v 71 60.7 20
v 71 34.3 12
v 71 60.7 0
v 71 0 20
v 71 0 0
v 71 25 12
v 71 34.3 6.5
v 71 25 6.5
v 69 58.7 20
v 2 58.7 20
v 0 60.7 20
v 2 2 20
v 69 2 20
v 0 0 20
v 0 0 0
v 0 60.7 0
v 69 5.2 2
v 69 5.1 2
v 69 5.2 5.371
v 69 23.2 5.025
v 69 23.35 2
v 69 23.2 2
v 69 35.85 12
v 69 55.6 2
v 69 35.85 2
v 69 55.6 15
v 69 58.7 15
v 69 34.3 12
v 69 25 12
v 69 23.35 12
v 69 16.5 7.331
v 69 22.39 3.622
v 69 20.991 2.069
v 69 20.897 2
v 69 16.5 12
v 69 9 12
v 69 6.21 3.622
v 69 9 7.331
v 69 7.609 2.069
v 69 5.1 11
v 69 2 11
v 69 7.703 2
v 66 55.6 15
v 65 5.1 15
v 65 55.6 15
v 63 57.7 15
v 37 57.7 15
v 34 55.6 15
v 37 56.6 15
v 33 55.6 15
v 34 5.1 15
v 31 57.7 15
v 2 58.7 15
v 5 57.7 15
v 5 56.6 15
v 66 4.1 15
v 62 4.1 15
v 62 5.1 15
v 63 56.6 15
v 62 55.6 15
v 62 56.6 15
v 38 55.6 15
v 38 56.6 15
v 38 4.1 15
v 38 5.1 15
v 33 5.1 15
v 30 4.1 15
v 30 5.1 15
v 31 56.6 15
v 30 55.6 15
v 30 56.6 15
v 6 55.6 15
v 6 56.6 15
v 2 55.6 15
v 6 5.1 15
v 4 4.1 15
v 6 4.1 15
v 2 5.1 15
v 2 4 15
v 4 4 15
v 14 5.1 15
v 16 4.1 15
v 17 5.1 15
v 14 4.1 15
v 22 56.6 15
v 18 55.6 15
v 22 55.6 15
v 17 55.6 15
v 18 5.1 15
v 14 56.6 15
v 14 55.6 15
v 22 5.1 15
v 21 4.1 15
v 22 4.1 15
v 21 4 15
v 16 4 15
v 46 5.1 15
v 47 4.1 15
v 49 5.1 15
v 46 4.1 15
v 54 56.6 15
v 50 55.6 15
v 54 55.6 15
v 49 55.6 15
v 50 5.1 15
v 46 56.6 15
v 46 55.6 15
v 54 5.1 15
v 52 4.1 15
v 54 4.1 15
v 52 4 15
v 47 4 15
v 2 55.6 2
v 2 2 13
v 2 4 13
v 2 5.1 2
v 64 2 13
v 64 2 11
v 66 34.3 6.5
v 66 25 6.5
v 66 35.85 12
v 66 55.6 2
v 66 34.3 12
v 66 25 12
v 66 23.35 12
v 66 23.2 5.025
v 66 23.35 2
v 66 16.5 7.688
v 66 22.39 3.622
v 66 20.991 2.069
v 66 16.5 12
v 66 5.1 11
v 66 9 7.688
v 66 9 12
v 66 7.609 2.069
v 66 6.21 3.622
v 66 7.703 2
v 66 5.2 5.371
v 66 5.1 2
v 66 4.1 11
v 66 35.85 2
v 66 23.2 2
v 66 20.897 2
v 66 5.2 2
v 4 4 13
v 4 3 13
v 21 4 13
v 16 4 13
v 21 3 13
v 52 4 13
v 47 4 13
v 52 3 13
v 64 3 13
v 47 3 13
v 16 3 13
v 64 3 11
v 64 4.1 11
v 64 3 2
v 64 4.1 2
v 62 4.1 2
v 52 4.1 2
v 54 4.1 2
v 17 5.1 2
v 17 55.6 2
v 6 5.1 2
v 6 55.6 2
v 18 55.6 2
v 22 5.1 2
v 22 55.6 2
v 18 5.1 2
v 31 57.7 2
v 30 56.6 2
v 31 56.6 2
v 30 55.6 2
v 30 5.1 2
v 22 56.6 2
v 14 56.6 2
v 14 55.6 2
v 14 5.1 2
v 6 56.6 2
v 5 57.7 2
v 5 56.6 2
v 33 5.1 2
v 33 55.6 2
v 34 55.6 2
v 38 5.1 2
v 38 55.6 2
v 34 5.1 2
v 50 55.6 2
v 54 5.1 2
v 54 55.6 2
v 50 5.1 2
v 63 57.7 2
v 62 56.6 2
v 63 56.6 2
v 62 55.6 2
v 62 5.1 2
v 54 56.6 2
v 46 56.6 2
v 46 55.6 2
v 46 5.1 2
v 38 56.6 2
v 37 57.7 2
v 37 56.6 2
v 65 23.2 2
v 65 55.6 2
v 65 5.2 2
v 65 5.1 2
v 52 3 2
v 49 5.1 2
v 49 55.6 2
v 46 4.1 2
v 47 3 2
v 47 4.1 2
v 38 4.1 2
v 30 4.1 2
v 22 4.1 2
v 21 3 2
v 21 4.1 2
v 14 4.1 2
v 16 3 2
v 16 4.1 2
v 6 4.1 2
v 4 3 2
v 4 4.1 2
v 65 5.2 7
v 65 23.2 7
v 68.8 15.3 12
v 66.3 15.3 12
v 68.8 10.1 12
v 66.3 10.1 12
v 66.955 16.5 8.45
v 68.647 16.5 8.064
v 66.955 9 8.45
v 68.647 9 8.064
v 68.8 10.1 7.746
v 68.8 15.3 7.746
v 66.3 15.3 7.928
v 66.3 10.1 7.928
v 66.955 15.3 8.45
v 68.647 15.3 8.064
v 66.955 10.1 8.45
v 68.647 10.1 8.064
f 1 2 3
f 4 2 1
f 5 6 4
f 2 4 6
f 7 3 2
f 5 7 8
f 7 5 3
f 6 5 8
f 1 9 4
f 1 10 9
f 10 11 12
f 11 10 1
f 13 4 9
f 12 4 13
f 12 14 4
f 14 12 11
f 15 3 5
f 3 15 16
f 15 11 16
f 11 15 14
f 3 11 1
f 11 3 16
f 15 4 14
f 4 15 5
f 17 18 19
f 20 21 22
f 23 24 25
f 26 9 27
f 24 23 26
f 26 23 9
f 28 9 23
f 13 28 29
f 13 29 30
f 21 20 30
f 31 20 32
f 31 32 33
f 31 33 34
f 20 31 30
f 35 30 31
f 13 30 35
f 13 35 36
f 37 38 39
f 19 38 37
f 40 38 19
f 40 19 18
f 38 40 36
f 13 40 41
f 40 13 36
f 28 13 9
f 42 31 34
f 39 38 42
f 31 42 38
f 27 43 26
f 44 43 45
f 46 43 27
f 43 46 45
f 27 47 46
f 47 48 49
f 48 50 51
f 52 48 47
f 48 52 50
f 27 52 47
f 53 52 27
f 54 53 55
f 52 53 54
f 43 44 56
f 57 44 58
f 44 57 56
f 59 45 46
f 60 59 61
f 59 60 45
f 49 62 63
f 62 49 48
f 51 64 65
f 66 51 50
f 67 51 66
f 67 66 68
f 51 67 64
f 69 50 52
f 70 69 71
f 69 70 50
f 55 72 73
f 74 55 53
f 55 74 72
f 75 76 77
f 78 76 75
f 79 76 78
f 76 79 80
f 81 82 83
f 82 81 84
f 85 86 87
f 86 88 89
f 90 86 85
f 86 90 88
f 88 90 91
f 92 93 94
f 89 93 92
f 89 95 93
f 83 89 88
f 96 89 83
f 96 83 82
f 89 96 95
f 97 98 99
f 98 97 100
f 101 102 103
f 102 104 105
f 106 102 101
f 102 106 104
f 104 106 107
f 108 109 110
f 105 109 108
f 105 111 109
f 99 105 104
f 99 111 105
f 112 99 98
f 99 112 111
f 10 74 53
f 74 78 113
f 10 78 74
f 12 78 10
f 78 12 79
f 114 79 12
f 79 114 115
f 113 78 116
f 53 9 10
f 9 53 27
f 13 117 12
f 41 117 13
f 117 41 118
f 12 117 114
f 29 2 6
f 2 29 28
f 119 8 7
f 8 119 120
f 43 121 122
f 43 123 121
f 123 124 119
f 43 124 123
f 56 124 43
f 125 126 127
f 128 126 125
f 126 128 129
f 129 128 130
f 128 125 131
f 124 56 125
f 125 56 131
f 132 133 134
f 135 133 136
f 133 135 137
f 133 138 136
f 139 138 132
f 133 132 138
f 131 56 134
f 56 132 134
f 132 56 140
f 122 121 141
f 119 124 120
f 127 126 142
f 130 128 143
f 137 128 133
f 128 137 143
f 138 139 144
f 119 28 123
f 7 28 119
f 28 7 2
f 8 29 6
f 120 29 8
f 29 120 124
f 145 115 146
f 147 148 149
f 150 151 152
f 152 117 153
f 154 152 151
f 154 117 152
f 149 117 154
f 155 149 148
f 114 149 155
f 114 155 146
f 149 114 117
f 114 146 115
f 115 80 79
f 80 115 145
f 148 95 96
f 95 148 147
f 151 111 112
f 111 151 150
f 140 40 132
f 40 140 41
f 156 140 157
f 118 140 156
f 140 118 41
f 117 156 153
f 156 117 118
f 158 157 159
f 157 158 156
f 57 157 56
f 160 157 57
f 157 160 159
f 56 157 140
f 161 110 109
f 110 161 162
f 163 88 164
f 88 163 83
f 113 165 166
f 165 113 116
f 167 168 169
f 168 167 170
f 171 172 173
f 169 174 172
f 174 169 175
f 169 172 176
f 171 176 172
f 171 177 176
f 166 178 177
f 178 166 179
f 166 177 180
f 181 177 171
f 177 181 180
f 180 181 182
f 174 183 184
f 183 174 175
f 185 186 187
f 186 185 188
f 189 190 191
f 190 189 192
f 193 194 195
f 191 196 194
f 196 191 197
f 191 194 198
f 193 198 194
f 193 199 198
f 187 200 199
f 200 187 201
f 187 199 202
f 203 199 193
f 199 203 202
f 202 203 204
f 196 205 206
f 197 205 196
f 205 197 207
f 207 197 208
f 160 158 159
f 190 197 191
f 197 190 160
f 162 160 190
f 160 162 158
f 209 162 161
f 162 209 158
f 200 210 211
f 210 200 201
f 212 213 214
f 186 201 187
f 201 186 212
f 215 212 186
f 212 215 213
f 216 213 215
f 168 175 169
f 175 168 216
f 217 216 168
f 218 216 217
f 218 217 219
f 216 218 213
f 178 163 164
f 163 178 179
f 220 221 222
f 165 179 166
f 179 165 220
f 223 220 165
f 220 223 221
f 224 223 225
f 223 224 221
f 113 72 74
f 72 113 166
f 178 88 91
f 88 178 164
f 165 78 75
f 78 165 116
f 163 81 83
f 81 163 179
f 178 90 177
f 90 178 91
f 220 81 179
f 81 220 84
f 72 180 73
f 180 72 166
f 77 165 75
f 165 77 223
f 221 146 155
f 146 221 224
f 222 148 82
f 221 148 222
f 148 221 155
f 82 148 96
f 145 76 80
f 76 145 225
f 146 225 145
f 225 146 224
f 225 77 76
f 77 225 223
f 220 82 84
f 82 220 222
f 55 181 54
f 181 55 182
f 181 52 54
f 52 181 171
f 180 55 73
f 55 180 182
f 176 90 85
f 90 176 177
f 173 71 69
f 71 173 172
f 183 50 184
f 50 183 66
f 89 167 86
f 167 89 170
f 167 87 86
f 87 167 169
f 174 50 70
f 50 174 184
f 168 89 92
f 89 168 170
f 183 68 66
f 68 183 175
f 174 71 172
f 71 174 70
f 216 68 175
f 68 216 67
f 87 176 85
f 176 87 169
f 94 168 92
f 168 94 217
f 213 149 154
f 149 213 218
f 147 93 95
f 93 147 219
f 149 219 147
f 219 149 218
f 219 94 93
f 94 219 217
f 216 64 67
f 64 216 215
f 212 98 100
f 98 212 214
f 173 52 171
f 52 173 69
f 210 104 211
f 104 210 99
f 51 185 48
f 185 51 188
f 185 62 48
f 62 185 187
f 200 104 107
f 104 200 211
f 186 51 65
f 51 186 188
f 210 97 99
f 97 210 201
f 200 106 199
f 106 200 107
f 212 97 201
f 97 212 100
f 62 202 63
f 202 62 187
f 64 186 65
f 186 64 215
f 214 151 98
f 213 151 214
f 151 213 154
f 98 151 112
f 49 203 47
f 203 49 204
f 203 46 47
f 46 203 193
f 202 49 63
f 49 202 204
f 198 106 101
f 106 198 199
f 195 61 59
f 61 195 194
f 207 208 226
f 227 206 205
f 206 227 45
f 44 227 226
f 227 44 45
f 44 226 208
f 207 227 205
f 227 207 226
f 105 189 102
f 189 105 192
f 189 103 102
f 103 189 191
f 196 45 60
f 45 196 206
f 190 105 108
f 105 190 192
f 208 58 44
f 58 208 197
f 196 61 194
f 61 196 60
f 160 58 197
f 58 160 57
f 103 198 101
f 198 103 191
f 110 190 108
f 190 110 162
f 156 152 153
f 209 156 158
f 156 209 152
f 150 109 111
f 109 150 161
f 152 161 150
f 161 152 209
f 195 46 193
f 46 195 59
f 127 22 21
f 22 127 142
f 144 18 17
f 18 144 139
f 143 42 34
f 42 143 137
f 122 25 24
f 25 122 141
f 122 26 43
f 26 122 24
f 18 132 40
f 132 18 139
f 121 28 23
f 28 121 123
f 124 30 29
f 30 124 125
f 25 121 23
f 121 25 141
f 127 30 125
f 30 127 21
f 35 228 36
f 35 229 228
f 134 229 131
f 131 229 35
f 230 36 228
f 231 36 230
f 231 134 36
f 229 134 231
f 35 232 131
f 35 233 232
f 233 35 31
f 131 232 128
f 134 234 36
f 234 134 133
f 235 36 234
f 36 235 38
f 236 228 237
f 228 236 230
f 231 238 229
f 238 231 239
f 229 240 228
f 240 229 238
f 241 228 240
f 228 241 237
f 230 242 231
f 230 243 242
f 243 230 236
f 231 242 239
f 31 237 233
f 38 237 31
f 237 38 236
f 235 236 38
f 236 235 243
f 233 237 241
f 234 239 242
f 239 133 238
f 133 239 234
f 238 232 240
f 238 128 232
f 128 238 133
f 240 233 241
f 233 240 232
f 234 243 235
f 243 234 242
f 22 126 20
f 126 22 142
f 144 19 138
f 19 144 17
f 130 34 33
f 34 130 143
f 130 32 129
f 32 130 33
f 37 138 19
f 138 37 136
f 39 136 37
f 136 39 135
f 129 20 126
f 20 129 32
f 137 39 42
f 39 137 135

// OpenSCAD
/*
 * @copyright Copyright (C) 2016 Leiden Tech. All rights reserved.
 * @license http://www.gnu.org/licenses/gpl-3.0.txt GNU General Public License v3
 * 
 * The Write.scad library can be found at http://www.thingiverse.com/thing:16193 or https://github.com/rohieb/Write.scad.git 
 */
use <Write.scad/Write.scad>
$slotsize=1.1;
$outsidewall=2;
$wall=2;
$height=13;
$length=71;
$totalheight=20;
center=false;
//AA
$l = 50.5; $w = 14.5;$gap=.5;
t=3;
      
difference(){ //outside wall ends
//bigbox
cube ([$length, $l+$wall*2+$slotsize*2+$outsidewall*2, $totalheight]);
//cutout
translate([$outsidewall,$outsidewall,$height+$wall])     
cube ([$length-$outsidewall*2, $l+$wall*2+$slotsize*2, $totalheight-$height]);
//slide switch
translate([$length-$outsidewall-3,25,$height/2])    
    cube ([8,9.3,5.5]);
    
rotate([90,0,270])
   translate([-11.1,15,-69.5])
   write("+",t=t-2,h=$height/4+2,center=center);
rotate([90,0,270])
   translate([-17,15,-69.5])
   write("-",t=t-2,h=$height/4+2,center=center);
    
rotate([90,0,90])
   translate([24,13.5,70])
   write("1",t=t-2,h=$height/4+2,center=center);
rotate([90,0,90])
   translate([32,13.5,70])
   write("0",t=t-2,h=$height/4+2,center=center);

//wires
translate([$wall,$wall,$height])    
    cube ([$length-$wall*2,2,2]); 
translate([$length-$wall*2-1,$wall*2,$height])    
    cube ([3,3,2]); 
translate([$length-$wall*2-3,$wall,$height-$wall])    
    cube ([5,2.1,6]);
translate([$length-$wall*2-1,$wall*2,$height-$wall])    
    cube ([3,2,2]);
//1
$index=2;
echo ($index);
translate([$index,$wall*1.5+$slotsize+$outsidewall/2,$wall])     
cube ([$w+$gap, $l, $height]);

translate([$index+$wall*2,$wall+$outsidewall/2,$wall])     
cube ([8, $l+$wall*2, $height]);


translate([$index+$wall,$wall+$outsidewall/2,$wall])     
cube ([12, $slotsize, $height]);
    
translate([$index+$wall*1.5,$l+$wall*2+$slotsize+$outsidewall/2,$wall])     
cube ([13, $slotsize, $height]);  
  
    
//2
$index2=18;
echo ($index2);
translate([$index2,$wall*1.5+$slotsize+$outsidewall/2,$wall])     
cube ([$w+$gap, $l, $height]);

translate([$index2+$wall*2,$wall+$outsidewall/2,$wall])     
cube ([8, $l+$wall*2, $height]);

translate([$index2+$wall*1.5,$wall+$outsidewall/2,$wall])     
cube ([13, $slotsize, $height]);
    
translate([$index2,$l+$wall*2+$slotsize+$outsidewall/2,$wall])     
cube ([13, $slotsize, $height]);  


//3
$index3=34;
echo ($index3);
translate([$index3,$wall*1.5+$slotsize+$outsidewall/2,$wall])     
cube ([$w+$gap, $l, $height]);

translate([$index3+$wall*2,$wall+$outsidewall/2,$wall])     
cube ([8, $l+$wall*2, $height]);

translate([$index3,$wall+$outsidewall/2,$wall])     
cube ([13, $slotsize, $height]);
    
translate([$index3+$wall*1.5,$l+$wall*2+$slotsize+$outsidewall/2,$wall])
cube ([13, $slotsize, $height]);  

//4
$index4=50;
echo ($index4);
translate([$index4,$wall*1.5+$slotsize+$outsidewall/2,$wall])
//battery
cube ([$w+$gap, $l, $height]);
//end cutout
translate([$index4+$wall*2,$wall+$outsidewall/2,$wall])     
cube ([8, $l+$wall*2, $height]);
 //left end    
translate([$index4+$wall,$wall+$outsidewall/2,$wall])
cube ([12, $slotsize, $height]);
//right end
translate([$index4,$l+$wall*2+$slotsize+$outsidewall/2,$wall])
cube ([13, $slotsize, $height]);      
       
//extra slot
$index5=66;
translate([$index5,$wall*1.5+$slotsize+$outsidewall/2,$wall])     
cube ([3, $l, $height]);
} 

difference() { 
//switch support
translate([66,$l/2+$wall+$slotsize+$outsidewall/2-6,$wall])     
cube ([4, 12.5, $height-3]);
 //slide switch
translate([$length-$outsidewall-3,25,$height/2])    
cube ([8,9.3,5.5]);   
}

//power plug
difference() { 
translate([66,$wall*1.5+6,$wall+5]) 
cube([4, 7.5, $height-8]);
translate([66.3,$wall*3+4.1,$wall+5] )  
cube([2.5, 5.2, $height-3]); 
rotate([90,0,0])
translate([67.4,6.5,-18])
cylinder(r=2,h=10); 
}
//lets curve this so it's easier to move the wires
difference () {
translate([65,$wall*2+1.2,$wall]) 
cube([4, 18, 5]);
rotate([90,0,90])
translate([14.3,9.5,66])
cylinder(r=10,h=10);  
}
